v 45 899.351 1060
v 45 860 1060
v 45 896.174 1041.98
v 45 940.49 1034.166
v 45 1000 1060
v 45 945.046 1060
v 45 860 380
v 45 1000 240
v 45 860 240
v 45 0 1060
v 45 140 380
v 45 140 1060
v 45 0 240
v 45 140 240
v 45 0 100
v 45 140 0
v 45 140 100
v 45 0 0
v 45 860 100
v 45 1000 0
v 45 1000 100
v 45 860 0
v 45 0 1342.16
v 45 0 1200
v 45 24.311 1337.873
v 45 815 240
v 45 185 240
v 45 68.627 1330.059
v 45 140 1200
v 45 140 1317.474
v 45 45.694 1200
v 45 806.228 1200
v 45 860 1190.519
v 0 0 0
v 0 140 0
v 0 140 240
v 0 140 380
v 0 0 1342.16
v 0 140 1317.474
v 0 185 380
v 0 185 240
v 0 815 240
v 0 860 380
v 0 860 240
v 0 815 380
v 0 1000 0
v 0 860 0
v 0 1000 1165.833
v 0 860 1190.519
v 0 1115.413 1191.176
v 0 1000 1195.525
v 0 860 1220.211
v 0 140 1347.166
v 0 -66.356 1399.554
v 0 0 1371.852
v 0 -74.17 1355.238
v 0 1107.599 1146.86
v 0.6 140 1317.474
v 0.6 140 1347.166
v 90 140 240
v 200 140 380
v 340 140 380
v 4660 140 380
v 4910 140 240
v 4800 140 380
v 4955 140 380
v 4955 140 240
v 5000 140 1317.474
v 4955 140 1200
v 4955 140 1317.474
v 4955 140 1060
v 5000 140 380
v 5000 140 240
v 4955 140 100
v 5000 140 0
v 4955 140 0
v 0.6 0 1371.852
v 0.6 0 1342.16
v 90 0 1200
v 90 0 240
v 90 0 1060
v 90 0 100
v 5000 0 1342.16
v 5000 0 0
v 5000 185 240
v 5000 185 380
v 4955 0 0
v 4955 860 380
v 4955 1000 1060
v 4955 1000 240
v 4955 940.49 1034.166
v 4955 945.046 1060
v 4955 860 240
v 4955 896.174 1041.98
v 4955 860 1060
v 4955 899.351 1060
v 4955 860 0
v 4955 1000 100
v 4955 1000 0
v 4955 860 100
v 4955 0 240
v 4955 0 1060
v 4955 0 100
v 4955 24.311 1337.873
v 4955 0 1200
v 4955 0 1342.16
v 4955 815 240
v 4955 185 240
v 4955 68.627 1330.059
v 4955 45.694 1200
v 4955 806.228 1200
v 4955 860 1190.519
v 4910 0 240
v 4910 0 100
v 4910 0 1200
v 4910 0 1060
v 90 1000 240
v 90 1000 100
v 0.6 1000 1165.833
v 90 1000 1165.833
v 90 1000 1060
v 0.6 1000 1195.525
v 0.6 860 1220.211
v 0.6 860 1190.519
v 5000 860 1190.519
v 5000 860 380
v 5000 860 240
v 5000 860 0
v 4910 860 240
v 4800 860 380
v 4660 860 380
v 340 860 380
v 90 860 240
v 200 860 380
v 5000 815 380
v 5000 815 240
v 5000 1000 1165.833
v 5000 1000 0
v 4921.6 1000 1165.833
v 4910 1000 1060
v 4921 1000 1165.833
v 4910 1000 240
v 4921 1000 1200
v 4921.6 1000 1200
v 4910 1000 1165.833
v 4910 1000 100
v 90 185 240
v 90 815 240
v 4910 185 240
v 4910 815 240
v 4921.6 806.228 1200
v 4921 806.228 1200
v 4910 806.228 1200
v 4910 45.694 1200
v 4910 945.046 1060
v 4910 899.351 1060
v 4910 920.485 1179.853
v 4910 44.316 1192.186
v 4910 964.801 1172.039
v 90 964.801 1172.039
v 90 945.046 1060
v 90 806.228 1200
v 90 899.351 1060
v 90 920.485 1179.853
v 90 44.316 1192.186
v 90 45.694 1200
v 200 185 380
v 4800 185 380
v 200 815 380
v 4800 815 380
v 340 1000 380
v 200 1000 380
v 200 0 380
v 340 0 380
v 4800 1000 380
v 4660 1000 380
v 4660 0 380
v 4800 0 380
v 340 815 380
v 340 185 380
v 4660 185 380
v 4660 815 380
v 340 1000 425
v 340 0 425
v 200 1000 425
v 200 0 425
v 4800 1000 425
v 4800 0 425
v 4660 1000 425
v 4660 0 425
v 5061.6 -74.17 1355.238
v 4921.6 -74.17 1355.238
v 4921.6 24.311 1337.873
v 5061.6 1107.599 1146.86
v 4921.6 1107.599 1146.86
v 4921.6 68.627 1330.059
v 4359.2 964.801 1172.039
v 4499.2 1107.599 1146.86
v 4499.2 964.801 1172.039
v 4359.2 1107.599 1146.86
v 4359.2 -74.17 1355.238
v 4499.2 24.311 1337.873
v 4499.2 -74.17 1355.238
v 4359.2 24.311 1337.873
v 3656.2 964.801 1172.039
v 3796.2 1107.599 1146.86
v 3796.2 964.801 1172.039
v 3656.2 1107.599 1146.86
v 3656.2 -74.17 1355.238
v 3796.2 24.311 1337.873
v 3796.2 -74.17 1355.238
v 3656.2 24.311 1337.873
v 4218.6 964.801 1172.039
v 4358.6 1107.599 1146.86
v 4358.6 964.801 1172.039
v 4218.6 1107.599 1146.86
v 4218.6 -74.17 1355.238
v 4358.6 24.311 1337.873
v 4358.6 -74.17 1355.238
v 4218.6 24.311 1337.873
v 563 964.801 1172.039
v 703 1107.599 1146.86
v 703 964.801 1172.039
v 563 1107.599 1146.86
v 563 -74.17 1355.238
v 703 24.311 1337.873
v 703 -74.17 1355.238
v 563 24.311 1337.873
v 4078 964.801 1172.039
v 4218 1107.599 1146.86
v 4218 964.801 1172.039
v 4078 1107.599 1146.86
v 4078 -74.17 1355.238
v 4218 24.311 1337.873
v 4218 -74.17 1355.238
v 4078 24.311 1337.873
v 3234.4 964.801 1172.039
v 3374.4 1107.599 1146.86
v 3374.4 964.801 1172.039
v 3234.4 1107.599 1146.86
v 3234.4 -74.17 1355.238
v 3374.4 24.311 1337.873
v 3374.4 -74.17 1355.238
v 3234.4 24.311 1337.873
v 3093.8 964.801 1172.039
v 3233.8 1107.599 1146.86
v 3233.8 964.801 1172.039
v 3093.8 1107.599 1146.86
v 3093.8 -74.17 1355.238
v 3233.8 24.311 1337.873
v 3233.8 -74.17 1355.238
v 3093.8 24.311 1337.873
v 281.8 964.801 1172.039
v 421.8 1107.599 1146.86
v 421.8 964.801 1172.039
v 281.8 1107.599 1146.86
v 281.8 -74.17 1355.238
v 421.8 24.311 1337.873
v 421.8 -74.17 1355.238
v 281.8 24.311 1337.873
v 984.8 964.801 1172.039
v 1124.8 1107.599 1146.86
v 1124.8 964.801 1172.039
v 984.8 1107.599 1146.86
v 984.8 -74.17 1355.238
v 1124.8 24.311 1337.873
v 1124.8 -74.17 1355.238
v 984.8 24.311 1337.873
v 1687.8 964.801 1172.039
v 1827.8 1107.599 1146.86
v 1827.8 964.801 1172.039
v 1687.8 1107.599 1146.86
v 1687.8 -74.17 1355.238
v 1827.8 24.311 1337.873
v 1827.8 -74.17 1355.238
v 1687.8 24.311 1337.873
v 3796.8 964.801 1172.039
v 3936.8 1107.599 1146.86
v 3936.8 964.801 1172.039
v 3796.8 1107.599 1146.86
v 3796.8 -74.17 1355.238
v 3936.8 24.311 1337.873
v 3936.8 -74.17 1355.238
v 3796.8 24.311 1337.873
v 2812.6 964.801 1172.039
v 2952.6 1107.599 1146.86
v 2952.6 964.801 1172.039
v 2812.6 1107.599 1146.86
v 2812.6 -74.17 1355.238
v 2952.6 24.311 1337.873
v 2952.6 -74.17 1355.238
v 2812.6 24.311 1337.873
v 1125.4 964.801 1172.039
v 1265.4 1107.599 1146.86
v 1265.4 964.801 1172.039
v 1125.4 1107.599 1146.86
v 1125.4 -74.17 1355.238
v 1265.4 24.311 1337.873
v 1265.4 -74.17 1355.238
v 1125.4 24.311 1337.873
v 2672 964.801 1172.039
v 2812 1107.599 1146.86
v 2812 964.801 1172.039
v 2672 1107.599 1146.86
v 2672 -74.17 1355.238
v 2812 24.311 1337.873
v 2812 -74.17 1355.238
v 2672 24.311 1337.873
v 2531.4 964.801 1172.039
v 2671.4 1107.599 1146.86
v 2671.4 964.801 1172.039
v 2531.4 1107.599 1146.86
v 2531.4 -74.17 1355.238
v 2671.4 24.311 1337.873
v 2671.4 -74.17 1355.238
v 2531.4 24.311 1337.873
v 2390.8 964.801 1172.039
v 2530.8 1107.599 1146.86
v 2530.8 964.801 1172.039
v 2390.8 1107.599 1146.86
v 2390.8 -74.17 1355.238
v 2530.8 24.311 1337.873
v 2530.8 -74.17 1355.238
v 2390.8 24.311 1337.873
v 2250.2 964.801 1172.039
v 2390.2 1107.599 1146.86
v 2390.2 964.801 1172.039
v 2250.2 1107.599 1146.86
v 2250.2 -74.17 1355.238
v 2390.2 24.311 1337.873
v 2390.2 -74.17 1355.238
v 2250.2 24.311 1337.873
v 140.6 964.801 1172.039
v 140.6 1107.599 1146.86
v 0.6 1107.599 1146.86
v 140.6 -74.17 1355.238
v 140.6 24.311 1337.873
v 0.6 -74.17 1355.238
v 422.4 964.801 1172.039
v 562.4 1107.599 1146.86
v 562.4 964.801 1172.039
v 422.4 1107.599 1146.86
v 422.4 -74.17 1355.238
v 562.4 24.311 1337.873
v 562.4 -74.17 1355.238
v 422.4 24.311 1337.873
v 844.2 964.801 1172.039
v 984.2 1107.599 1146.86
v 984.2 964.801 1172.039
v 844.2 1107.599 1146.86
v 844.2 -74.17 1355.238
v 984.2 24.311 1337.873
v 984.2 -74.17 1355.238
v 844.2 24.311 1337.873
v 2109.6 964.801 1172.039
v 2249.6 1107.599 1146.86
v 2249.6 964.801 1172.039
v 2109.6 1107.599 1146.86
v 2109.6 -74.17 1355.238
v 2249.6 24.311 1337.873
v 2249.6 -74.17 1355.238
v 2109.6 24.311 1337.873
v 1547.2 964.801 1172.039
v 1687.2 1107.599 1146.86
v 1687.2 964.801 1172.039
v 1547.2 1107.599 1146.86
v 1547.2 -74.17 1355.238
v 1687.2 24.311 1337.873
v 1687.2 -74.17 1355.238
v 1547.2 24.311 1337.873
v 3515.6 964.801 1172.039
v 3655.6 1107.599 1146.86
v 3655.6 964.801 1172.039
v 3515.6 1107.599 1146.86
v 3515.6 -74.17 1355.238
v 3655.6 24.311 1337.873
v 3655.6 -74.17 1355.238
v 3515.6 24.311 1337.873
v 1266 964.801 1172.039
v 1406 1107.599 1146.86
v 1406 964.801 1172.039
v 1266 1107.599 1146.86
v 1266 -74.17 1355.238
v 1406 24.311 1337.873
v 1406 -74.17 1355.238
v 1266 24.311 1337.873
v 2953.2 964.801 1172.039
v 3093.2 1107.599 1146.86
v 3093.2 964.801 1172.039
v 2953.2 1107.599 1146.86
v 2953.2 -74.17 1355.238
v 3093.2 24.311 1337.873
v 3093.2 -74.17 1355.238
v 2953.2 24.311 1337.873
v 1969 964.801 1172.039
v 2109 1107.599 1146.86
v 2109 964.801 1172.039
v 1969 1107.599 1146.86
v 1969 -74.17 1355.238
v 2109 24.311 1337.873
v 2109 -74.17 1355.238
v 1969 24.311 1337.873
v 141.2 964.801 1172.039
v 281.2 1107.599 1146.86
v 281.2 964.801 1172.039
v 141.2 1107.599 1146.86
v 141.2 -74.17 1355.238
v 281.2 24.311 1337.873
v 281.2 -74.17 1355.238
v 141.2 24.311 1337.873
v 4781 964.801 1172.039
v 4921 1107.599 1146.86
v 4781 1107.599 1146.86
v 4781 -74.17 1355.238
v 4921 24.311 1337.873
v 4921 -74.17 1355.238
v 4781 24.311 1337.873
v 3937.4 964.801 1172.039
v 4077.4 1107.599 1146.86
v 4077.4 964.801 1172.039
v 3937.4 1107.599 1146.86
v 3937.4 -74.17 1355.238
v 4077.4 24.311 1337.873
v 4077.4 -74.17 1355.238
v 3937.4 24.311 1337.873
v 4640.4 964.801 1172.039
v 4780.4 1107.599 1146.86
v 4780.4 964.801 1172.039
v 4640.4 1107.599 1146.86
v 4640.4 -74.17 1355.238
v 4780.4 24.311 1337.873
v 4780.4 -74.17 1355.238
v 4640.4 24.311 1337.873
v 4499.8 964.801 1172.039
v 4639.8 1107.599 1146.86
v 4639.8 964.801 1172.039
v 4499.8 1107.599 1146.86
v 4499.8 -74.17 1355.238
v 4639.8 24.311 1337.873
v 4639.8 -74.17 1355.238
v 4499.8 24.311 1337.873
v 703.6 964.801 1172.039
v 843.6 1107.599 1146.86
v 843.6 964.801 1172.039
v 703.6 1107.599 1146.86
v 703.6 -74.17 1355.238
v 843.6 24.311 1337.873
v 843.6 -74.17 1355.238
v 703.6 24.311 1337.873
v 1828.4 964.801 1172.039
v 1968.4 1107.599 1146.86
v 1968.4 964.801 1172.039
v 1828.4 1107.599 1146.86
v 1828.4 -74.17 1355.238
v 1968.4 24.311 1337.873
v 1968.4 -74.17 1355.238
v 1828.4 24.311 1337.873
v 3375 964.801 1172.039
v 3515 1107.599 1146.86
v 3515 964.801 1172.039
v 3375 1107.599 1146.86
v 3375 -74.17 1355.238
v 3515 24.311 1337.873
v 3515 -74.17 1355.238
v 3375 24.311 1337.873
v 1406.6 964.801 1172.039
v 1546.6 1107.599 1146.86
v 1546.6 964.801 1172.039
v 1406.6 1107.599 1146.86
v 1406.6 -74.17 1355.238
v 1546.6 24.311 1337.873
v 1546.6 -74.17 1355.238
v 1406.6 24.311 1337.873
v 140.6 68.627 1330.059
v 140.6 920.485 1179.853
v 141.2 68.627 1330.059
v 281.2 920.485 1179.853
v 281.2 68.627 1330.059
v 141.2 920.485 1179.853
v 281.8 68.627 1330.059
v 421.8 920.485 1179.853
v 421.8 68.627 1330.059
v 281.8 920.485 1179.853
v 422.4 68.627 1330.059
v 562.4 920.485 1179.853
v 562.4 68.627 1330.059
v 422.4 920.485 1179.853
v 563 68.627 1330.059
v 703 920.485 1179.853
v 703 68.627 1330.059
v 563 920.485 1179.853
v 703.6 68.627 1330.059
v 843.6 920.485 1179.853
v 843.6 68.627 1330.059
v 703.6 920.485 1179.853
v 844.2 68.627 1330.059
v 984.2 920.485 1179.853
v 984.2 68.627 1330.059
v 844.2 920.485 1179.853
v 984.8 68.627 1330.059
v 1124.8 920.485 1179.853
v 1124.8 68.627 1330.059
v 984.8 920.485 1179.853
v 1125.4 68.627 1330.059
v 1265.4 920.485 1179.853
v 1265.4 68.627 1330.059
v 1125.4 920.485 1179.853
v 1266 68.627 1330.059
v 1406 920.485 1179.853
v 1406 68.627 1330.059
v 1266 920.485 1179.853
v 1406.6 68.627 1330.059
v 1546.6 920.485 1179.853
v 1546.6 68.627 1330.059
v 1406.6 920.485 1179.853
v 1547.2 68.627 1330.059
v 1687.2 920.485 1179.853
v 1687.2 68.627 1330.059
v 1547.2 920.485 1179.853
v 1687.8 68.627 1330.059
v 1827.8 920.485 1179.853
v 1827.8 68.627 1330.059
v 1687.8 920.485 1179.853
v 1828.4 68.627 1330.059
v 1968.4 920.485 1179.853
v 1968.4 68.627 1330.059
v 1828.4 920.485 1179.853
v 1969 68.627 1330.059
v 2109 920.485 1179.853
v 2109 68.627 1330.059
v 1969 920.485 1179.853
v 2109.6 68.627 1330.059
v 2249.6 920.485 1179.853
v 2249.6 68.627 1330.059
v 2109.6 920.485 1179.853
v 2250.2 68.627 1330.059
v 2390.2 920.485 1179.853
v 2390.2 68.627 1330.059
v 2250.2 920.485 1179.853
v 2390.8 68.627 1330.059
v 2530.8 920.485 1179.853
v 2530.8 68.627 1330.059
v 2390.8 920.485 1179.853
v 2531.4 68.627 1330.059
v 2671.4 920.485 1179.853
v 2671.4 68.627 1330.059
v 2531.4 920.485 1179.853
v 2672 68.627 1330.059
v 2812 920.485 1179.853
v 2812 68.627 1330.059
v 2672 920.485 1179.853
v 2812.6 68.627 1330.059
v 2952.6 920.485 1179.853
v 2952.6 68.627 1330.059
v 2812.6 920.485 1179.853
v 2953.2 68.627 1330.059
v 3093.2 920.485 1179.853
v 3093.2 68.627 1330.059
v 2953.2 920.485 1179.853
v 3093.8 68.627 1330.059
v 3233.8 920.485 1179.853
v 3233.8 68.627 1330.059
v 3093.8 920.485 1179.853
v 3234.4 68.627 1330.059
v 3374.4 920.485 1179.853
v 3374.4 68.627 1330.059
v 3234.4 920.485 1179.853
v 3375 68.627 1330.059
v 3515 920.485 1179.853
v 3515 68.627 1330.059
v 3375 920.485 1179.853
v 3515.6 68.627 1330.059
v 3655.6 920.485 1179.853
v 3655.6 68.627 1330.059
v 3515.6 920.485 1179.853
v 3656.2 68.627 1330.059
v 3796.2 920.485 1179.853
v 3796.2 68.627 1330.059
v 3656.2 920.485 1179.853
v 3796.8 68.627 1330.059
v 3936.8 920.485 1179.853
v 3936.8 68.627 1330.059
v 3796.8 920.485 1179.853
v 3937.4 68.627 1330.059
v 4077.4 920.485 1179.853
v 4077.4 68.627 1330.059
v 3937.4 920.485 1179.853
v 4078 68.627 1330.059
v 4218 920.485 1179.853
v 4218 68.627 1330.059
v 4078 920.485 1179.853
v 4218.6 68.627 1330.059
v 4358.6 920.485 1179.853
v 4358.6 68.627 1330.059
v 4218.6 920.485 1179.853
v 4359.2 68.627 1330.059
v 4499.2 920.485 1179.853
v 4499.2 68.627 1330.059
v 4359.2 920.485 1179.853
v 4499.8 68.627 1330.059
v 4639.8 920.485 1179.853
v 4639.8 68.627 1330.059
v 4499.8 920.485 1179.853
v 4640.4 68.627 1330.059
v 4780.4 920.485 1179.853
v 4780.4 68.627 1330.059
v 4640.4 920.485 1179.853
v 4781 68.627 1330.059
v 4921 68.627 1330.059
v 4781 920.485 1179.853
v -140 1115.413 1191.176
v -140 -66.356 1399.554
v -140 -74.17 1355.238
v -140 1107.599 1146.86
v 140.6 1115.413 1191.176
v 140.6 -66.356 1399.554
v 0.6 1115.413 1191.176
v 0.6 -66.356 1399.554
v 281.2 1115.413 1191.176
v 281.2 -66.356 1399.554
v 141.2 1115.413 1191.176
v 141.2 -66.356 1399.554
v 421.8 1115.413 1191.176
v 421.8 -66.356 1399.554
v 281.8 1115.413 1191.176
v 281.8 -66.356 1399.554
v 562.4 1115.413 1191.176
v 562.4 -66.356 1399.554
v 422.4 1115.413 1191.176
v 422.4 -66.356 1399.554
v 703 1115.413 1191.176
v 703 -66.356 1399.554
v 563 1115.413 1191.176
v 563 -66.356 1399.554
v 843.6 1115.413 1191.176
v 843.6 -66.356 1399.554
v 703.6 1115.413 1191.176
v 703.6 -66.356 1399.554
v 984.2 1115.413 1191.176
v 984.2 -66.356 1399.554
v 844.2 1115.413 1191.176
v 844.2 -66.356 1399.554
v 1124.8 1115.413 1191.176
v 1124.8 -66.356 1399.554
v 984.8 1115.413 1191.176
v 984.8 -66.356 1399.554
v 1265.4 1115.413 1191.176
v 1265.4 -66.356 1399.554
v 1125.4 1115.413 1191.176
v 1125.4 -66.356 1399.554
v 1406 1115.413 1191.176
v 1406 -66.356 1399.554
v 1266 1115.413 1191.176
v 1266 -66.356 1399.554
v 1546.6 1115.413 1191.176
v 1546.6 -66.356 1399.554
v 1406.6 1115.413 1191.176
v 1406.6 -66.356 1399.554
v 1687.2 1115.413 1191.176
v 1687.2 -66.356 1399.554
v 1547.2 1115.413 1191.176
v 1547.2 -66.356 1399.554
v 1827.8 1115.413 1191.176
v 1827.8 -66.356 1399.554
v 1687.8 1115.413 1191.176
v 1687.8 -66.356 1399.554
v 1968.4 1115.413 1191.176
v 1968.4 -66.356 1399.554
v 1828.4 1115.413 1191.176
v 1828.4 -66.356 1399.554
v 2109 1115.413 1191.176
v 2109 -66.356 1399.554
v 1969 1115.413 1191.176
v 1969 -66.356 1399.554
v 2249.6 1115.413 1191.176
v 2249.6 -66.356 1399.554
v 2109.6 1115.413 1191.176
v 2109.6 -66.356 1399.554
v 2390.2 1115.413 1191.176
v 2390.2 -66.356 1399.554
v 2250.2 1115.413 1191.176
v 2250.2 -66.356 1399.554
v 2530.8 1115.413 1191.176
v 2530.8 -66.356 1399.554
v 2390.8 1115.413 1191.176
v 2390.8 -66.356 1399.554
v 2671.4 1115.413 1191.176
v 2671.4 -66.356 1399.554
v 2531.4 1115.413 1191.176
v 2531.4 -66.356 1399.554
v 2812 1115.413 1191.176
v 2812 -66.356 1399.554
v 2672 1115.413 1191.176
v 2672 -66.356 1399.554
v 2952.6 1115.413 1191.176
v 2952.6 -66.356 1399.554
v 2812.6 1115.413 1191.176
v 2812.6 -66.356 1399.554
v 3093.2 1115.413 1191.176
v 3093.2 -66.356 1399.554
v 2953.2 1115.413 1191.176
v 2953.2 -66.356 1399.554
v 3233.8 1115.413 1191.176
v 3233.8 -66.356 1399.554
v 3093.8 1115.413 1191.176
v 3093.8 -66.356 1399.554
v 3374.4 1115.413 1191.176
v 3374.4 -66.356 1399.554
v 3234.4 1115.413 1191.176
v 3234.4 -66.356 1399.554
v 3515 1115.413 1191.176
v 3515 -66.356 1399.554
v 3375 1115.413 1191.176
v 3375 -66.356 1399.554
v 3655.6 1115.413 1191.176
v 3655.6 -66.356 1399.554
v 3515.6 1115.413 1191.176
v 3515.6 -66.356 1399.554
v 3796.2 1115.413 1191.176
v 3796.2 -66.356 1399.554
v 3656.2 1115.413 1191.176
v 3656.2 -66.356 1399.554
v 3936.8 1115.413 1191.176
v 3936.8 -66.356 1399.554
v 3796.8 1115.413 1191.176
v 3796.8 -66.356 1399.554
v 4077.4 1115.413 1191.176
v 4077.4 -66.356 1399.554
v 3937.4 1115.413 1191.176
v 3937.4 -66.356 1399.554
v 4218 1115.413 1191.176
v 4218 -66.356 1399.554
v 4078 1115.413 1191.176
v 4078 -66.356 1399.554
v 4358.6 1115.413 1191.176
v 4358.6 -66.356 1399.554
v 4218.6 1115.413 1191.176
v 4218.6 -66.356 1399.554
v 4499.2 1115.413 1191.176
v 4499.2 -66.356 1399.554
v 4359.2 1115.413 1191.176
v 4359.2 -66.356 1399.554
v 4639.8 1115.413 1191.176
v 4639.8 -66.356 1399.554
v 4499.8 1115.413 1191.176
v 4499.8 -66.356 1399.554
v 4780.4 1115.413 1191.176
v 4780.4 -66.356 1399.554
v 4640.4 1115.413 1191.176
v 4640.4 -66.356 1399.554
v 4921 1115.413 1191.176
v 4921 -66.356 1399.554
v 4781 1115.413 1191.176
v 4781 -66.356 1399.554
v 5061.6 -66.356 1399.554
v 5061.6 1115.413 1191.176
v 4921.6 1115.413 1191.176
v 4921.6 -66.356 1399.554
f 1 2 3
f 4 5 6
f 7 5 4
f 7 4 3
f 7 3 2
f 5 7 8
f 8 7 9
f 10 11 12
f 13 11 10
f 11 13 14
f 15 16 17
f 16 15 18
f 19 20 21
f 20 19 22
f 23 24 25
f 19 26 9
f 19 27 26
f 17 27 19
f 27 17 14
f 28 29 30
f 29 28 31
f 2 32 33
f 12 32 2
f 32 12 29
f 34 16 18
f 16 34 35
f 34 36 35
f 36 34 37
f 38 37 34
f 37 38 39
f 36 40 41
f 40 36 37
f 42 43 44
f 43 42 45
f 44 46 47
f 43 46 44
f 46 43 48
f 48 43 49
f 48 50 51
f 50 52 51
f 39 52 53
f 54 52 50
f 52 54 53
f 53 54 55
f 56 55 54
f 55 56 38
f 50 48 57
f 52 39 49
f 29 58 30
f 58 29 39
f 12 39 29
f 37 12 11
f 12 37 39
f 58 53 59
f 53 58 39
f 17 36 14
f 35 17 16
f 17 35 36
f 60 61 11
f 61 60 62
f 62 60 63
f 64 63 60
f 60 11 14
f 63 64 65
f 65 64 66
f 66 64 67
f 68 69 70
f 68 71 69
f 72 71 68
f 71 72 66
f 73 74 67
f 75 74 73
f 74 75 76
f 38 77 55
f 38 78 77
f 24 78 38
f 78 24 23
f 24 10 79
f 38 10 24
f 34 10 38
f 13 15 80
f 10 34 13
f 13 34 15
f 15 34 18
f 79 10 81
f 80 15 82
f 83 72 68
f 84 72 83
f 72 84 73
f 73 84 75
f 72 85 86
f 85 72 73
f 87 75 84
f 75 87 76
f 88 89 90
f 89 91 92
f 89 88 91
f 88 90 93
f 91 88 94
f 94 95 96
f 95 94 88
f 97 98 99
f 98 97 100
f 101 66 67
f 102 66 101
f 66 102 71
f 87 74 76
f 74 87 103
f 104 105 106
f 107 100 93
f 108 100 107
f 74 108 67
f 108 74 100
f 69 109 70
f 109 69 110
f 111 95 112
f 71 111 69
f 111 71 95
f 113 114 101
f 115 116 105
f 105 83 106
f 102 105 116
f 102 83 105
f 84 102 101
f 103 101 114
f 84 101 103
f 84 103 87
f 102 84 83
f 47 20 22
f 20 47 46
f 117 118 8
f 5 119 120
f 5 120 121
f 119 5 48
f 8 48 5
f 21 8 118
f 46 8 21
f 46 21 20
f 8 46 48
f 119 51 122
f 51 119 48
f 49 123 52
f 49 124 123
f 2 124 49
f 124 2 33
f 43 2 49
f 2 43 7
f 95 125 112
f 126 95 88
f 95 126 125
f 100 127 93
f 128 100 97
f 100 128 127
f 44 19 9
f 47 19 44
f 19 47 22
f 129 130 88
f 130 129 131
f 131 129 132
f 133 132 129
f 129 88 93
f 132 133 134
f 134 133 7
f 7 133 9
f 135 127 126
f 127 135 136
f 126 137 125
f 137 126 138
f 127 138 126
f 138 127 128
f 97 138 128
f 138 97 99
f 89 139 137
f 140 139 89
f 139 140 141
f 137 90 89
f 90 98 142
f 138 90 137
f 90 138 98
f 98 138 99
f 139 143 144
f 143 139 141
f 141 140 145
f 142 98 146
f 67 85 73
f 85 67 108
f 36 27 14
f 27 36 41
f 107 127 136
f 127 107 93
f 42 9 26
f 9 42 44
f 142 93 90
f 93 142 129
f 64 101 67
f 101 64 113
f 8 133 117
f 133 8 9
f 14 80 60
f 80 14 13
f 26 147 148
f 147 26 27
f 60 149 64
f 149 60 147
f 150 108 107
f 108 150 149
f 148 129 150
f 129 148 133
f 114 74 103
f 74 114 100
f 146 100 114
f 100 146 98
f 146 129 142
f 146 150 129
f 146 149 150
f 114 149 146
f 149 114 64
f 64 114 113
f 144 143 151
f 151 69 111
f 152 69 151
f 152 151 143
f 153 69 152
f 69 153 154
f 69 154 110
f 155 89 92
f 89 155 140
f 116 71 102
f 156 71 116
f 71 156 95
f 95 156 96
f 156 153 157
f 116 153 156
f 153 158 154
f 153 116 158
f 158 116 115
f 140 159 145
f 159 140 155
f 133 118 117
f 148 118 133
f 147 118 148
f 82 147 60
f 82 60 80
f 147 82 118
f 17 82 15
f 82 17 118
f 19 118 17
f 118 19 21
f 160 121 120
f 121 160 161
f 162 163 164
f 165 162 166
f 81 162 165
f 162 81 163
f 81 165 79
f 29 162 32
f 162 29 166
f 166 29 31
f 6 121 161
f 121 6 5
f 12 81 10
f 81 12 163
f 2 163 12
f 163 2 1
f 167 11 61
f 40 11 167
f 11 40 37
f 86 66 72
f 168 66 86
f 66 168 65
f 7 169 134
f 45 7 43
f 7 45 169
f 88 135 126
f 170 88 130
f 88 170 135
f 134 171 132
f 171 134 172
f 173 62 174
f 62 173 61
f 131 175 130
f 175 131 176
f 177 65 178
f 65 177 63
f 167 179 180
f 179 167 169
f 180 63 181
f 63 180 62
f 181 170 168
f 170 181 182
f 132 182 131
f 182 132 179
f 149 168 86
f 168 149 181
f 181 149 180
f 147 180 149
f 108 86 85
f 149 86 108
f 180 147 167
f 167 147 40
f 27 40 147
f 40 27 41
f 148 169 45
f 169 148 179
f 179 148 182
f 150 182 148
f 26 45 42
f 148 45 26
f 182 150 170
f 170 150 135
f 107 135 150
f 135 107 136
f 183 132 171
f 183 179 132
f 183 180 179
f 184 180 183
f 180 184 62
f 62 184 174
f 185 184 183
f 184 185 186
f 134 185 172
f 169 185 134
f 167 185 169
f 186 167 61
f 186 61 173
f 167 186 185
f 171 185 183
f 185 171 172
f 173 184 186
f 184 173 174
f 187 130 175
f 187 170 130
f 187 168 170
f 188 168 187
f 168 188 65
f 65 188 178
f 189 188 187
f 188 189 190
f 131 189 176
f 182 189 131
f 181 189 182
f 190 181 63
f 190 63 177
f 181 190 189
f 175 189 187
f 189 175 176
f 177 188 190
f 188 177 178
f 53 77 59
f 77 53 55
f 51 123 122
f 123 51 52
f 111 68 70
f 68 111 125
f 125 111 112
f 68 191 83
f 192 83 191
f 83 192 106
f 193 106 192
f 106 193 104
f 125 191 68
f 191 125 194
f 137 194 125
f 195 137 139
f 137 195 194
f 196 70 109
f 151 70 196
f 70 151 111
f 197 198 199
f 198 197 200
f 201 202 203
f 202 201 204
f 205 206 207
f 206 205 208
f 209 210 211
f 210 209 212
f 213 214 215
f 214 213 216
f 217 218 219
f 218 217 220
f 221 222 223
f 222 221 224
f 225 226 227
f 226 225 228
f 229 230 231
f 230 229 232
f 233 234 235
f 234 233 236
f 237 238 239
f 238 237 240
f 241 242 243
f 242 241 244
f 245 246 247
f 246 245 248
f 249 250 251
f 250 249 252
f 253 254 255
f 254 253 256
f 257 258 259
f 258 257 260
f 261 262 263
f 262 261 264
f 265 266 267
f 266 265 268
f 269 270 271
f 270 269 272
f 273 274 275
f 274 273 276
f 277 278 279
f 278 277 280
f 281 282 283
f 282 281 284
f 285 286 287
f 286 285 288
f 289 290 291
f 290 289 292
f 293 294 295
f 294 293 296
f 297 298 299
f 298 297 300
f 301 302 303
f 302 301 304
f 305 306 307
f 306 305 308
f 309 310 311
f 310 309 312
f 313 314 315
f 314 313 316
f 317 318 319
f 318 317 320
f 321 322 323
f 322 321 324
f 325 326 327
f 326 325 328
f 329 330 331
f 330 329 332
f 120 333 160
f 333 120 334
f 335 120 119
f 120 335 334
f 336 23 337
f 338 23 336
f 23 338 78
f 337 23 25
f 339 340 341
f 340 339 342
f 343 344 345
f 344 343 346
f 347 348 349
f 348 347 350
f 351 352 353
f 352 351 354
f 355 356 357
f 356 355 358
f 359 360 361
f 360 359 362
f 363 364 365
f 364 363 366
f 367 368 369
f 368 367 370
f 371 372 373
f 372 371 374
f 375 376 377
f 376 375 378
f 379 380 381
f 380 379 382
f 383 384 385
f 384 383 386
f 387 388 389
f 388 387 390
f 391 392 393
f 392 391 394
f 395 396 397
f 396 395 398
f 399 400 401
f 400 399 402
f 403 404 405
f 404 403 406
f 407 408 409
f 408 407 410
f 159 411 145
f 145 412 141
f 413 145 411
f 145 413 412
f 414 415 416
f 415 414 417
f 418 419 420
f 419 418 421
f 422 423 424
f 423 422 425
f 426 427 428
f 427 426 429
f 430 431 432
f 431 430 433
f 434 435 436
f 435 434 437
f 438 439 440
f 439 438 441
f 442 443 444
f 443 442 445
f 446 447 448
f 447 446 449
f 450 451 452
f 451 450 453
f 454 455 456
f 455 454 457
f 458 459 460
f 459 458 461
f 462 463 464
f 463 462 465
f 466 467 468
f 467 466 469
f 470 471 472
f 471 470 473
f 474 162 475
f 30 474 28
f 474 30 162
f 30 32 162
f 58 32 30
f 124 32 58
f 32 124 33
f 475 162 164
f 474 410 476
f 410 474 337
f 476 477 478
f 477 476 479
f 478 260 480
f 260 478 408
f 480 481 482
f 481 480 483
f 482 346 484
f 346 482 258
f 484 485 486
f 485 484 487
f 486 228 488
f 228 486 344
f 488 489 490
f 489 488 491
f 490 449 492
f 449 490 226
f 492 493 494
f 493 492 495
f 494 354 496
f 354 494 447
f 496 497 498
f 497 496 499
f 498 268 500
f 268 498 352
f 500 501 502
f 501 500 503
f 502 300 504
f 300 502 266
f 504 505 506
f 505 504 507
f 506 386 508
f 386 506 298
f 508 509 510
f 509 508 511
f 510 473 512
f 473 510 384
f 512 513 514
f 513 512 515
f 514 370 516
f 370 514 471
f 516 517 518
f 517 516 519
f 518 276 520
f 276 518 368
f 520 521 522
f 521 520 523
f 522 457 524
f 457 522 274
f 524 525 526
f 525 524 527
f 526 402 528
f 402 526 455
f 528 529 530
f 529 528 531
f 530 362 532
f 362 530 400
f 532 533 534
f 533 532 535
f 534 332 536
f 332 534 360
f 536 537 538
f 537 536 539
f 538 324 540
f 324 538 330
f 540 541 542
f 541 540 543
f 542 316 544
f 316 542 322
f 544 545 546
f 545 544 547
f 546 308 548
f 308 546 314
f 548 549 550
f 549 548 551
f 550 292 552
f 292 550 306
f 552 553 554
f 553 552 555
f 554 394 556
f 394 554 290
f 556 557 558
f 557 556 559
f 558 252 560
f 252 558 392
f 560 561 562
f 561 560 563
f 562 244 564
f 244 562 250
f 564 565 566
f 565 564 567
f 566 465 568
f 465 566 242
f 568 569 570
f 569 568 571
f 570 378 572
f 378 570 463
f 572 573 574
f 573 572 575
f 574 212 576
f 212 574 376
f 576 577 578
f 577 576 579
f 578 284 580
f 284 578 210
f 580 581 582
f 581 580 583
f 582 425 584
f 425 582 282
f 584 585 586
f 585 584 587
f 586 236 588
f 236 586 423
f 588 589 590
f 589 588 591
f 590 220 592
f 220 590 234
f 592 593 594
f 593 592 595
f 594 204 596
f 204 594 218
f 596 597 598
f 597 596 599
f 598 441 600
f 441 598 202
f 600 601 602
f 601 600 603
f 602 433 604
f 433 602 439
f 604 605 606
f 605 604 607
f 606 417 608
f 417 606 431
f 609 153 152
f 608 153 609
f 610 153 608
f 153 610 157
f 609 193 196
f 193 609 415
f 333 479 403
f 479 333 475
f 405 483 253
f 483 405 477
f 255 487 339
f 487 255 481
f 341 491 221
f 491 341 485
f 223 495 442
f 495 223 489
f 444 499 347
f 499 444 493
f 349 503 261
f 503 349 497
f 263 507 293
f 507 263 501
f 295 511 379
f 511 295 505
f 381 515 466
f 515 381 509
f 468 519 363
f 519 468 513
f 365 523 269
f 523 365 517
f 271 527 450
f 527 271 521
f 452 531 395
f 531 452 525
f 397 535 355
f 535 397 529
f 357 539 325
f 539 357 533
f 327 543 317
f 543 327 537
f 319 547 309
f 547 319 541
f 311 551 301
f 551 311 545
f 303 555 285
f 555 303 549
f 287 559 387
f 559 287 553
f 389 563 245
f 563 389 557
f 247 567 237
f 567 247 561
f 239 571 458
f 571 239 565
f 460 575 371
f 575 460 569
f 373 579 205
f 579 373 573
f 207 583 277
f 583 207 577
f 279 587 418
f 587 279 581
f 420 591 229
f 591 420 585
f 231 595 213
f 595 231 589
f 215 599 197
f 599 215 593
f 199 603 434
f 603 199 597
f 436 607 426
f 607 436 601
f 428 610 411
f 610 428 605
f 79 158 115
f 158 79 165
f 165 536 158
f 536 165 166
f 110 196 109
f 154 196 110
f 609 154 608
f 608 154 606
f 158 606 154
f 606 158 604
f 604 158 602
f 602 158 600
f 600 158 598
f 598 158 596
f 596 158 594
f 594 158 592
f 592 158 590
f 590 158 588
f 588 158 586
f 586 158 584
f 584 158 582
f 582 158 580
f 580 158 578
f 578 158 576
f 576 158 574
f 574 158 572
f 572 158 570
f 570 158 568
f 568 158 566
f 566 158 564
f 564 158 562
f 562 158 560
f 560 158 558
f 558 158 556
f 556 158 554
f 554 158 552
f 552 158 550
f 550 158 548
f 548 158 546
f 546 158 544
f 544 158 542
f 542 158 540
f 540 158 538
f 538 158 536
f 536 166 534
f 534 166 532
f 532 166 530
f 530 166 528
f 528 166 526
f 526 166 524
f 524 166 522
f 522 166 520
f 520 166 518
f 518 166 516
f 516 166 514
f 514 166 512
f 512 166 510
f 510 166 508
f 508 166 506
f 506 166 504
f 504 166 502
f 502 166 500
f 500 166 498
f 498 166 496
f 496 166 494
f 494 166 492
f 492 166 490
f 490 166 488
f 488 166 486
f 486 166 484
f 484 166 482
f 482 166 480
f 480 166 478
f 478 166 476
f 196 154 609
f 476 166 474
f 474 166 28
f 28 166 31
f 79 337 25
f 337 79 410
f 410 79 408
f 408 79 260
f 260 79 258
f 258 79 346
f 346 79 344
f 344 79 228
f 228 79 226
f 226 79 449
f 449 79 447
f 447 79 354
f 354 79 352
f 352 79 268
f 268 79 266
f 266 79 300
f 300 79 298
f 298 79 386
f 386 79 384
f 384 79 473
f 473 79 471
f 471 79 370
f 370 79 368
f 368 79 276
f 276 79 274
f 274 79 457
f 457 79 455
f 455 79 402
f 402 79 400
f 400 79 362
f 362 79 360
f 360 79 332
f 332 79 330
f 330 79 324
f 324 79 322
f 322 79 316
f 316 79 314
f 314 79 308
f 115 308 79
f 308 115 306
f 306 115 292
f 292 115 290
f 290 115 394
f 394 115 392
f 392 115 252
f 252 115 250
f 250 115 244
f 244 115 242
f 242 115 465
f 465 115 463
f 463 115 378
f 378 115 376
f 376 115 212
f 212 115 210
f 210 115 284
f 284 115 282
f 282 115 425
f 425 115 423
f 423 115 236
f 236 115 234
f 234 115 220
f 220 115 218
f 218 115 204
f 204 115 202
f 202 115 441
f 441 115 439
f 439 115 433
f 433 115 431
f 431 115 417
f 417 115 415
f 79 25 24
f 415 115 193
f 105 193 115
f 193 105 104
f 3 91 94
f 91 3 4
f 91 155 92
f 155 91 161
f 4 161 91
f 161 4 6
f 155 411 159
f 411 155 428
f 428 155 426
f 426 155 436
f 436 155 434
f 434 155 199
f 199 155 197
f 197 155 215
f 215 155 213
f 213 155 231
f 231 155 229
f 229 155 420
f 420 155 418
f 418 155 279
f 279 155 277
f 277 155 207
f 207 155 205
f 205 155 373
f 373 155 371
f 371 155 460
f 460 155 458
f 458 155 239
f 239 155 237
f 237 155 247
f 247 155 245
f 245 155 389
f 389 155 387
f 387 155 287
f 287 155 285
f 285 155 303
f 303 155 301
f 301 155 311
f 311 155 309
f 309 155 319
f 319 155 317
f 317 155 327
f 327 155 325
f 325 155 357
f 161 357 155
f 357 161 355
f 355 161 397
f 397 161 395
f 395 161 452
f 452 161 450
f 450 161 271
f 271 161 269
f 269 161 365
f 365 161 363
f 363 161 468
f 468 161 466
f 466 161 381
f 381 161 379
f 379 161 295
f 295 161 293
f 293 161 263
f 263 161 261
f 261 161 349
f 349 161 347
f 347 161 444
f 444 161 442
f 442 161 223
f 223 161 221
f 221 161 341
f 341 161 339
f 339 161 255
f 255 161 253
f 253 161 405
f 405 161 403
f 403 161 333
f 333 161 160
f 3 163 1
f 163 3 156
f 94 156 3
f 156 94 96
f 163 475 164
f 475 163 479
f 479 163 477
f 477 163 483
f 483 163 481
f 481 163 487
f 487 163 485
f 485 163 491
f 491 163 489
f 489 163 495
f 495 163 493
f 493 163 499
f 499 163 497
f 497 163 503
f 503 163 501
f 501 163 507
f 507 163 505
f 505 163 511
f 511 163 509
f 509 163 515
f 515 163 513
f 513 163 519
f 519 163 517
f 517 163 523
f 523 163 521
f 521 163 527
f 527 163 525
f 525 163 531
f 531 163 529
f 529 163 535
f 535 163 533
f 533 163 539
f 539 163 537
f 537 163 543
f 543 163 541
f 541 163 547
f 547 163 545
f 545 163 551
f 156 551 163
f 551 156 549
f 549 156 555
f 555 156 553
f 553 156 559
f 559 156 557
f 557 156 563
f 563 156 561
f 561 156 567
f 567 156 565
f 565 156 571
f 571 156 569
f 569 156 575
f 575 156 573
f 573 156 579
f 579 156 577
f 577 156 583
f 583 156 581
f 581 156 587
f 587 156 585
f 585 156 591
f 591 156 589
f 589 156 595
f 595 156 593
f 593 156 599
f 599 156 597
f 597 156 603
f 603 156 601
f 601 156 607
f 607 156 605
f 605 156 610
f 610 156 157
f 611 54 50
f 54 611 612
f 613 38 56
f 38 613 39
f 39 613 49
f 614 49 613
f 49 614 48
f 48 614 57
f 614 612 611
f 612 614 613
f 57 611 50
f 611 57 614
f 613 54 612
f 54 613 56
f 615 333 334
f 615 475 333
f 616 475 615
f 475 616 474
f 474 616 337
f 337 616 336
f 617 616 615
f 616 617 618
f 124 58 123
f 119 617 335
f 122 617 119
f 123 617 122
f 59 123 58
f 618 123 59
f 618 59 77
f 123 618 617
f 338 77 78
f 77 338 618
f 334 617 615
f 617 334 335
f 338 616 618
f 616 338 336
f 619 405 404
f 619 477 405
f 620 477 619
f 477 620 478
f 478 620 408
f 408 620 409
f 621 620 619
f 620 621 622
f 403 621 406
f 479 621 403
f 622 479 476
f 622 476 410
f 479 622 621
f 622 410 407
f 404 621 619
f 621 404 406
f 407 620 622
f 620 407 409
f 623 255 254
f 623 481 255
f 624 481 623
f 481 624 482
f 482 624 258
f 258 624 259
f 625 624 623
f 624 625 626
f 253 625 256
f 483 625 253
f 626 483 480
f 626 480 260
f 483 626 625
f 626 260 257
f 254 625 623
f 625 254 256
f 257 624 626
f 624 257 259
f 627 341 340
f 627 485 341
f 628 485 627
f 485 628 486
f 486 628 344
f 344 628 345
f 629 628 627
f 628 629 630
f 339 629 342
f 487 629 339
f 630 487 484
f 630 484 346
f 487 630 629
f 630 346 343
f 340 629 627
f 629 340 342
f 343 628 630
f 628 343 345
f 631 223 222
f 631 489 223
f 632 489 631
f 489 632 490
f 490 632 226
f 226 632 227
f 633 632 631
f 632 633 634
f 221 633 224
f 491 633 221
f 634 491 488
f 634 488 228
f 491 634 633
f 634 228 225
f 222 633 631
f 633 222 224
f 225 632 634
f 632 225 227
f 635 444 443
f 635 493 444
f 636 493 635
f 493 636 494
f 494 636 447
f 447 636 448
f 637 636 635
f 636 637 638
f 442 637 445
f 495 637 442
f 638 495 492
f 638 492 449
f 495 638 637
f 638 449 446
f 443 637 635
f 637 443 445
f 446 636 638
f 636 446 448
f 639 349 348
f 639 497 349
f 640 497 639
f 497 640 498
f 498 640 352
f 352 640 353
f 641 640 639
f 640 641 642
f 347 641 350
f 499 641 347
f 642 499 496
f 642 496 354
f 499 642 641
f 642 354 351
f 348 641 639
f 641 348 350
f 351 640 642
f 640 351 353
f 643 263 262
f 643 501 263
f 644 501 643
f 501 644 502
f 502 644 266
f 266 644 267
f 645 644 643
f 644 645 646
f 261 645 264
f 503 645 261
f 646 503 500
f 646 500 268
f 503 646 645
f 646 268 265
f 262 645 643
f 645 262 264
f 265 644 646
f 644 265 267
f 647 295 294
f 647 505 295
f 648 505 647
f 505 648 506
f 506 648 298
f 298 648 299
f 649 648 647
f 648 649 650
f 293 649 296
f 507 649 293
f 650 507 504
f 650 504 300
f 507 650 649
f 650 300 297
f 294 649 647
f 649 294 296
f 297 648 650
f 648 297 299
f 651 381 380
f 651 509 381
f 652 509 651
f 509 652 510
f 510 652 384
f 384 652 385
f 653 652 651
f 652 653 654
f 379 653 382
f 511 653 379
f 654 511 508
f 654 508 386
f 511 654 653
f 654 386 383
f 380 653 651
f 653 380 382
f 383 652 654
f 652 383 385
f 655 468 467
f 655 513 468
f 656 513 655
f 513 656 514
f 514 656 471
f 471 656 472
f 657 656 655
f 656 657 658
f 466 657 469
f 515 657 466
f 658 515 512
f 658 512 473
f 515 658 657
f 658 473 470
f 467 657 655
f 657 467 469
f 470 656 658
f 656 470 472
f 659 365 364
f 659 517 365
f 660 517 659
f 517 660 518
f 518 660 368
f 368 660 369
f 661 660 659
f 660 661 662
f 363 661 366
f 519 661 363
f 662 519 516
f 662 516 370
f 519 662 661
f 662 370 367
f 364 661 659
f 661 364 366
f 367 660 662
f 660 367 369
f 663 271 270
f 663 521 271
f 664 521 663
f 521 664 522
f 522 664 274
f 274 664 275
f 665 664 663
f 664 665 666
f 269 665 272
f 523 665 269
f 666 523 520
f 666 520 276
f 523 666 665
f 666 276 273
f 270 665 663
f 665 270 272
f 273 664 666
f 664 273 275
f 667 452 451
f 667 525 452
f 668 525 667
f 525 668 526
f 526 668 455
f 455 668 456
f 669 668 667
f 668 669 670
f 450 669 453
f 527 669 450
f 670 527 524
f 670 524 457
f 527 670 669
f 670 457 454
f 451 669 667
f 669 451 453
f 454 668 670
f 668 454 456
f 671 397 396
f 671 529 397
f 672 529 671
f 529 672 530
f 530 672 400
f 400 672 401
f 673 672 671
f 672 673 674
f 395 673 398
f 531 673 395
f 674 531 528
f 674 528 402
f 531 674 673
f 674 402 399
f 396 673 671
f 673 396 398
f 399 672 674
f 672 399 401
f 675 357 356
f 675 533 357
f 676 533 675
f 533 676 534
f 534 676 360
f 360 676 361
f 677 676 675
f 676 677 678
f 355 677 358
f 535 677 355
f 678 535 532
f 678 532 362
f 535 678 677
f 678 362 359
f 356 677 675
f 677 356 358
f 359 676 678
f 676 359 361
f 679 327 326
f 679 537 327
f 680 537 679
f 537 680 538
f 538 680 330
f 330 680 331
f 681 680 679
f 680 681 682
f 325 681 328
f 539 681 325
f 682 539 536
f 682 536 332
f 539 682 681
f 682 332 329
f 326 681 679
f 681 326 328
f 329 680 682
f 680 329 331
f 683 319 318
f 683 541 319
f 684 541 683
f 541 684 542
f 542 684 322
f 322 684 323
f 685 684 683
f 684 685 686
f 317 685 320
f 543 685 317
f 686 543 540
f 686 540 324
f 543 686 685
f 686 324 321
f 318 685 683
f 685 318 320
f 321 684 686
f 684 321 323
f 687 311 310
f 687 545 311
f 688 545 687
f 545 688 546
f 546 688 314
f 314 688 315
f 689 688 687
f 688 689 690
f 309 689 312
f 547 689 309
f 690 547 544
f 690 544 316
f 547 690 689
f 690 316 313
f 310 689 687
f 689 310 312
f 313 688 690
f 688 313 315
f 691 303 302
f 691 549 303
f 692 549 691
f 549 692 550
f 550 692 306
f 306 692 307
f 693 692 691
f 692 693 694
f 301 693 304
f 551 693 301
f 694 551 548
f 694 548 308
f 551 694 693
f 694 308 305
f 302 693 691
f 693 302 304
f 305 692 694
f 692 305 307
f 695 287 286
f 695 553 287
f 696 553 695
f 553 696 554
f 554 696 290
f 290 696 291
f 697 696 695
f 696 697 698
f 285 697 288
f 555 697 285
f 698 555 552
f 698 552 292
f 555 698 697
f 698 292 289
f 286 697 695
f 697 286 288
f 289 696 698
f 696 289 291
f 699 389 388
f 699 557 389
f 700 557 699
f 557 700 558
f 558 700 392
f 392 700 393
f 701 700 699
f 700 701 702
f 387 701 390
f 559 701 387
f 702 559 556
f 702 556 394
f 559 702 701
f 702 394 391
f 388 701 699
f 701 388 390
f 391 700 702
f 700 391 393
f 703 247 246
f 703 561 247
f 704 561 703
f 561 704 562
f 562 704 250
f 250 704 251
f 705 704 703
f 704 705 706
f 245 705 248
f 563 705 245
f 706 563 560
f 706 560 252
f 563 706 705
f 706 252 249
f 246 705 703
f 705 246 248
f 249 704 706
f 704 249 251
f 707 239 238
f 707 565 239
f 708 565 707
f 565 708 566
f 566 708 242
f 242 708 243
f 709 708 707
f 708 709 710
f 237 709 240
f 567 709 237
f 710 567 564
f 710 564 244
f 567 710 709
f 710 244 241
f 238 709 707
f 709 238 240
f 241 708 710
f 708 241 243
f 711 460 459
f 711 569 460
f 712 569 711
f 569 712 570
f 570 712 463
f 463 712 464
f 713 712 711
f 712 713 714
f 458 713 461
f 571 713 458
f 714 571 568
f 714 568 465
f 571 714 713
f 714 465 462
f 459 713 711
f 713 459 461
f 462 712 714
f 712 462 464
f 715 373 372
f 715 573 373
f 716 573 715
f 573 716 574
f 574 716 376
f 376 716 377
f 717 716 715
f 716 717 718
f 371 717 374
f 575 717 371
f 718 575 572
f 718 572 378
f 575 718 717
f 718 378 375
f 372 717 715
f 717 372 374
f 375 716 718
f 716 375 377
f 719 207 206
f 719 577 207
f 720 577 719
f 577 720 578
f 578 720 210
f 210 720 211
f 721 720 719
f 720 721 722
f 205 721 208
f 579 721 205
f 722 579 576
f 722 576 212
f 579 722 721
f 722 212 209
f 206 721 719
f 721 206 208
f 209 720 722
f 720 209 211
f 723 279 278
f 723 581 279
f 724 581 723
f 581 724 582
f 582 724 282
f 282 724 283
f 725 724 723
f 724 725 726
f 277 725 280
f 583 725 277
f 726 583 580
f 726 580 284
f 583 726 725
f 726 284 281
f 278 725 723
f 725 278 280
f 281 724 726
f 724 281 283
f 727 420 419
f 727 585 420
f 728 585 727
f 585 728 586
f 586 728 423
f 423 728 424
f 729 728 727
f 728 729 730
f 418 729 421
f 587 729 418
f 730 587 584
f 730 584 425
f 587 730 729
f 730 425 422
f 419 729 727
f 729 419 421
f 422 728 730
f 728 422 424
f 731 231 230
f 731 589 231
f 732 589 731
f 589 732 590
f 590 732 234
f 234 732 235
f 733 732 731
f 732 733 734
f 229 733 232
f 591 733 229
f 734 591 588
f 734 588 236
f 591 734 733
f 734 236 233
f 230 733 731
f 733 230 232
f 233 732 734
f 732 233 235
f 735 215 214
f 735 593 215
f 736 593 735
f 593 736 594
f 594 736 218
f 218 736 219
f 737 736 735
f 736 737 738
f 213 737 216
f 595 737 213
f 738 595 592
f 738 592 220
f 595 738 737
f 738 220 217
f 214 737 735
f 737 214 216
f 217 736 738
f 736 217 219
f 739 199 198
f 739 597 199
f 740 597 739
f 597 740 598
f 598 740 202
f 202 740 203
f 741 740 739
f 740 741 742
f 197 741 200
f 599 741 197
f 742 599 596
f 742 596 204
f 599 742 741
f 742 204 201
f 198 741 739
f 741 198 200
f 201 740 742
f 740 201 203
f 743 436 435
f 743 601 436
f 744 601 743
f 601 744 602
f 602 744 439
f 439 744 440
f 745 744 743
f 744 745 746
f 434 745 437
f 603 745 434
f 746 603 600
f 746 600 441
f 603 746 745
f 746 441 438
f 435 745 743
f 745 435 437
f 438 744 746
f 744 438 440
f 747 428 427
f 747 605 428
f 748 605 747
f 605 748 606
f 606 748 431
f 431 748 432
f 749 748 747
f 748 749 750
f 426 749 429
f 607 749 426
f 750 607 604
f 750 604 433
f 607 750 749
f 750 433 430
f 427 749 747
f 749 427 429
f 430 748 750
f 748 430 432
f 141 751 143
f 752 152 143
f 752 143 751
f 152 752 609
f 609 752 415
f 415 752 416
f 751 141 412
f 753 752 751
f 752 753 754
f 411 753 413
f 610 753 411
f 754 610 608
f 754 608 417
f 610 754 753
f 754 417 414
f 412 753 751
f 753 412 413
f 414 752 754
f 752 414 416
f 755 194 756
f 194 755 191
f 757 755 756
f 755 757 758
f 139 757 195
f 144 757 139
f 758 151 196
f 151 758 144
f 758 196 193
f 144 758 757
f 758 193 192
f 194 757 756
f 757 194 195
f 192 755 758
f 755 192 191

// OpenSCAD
// file: roof.scad
/*

    Nightstand
    
    By Anton Augustsson
    
    
*/



module roof (
    rotation,roofHeight,
    studsAmount,
    plankWidth,plankThickness,
    totalWidth,totalLength,
    roofHangover,roofWidthIn){



// ---------- Calculated varables ----------
roofWidthOut = roofHangover*2+roofWidthIn; // calculated    
studsSpacing = (roofWidthIn-(studsAmount*plankThickness)) /(studsAmount-1)-0.001;  // calculated 
//studsAmount*plankThickness+i(studsAmount-1)=totalLength
    


// ---------- Code ---------- 

translate([0,0,roofHeight])
rotate([-rotation,0,0])     
union(){
    
// ---------- Stud ---------- 
color("Wheat")
union(){
for(i = [0:studsSpacing:roofWidthIn])
translate([
    0,
    i,
    0]) 
cube(size = [
    totalLength,
    plankThickness,
    plankWidth]);

}


// ---------- Roof ----------
color("Tan")
union(){
for(i = [-plankWidth:plankWidth+0.6:totalLength])
translate([
    i,
    -roofHangover,
    plankWidth]) 
cube(size = [
    plankWidth,
    roofWidthOut,
    plankThickness]);

}}}



/*
    ---------- Exampel ---------- 
*/


rotation = 10;
plankWidth     = 140;  // pine

plankThickness = 45;  // pine

totalWidth  = 1000;  // kayak width 
totalLength = 2000;  // kayak lenght

roofHangover = 100;  // etch side, only to studes
roofWidthIn  = 1000;  // calculated hypnotherapy, inner

studsAmount  = 2;  // kayak lenght, oposid diraction

roofHeight = 1;


roof (rotation,roofHeight,
    studsAmount,
    plankWidth,plankThickness,
    totalWidth,totalLength,
    roofHangover,roofWidthIn);
// file: foundation.scad
module foundation (
    rotation,
    plankWidth,plankThickness,
    totalWidth,totalLength,
    roofWidthIn,groundScrewHeight,
    pilleaLowestHeight,backPillarHeight,frontPillarHeight){
    
    
// ---------- Calculated varables ----------
backPillarHeight  = pilleaLowestHeight
    +tan(rotation)*plankWidth; // calculated
frontPillarHeight = pilleaLowestHeight
    +tan(rotation)*(roofWidthIn); // calculated     


// ---------- Code ---------- 

difference() {        
union(){    
// ---------- pillar ---------- 
color("Wheat")
union(){

// piller 1
translate([
    0,
    0,
    0]) 
cube(size = [
    plankThickness,
    plankWidth,
    frontPillarHeight]);
    
// piller 2
translate([
    totalLength-plankThickness,
    0,
    0]) 
cube(size = [
    plankThickness,
    plankWidth,
    frontPillarHeight]);
    
// piller 3
translate([
    0,
    totalWidth-plankWidth,
    0]) 
cube(size = [
    plankThickness,
    plankWidth,
    backPillarHeight]);
    
// piller 4
translate([
    totalLength-plankThickness,
    totalWidth-plankWidth,
    0]) 
cube(size = [
    plankThickness,
    plankWidth,
    backPillarHeight]);

}

union(){
// right lower stude
translate([
    totalLength-plankThickness*2,
    0,
    groundScrewHeight]) 
cube(size = [
    plankThickness,
    totalWidth,
    plankWidth]);

// right upper stude
translate([
    totalLength-plankThickness*2,
    0,
    pilleaLowestHeight-plankWidth]) 
cube(size = [
    plankThickness,
    totalWidth,
    plankWidth]);
    
// left lower stude
translate([
    plankThickness,
    0,
    groundScrewHeight]) 
cube(size = [
    plankThickness,
    totalWidth,
    plankWidth]);

// left upper stude
translate([
    plankThickness,
    0,
    pilleaLowestHeight-plankWidth]) 
cube(size = [
    plankThickness,
    totalWidth,
    plankWidth]);
}

union(){
// front stude
translate([
    0,
    plankWidth,
    groundScrewHeight+plankWidth]) 
cube(size = [
    totalLength,
    plankThickness,
    plankWidth]);

// back stude
translate([
    0,
    totalWidth-plankWidth-plankThickness,
    groundScrewHeight+plankWidth]) 
cube(size = [
    totalLength,
    plankThickness,
    plankWidth]);

}

union(){
// left kayak stude
translate([
    200,
    0,
    groundScrewHeight+plankWidth*2]) 
cube(size = [
    plankWidth,
    totalWidth,
    plankThickness]);

// right kayak stude
translate([
    totalLength-200-plankWidth,
    0,
    groundScrewHeight+plankWidth*2]) 
cube(size = [
    plankWidth,
    totalWidth,
    plankThickness]);
}

}

// moveDown = cos(rotation)*plankThickness
// 

rotate([-rotation,0,0])
union(){
translate([
    0,
    -291,
    frontPillarHeight-cos(rotation)*plankThickness+19]) 
cube(size = [
    plankWidth,
    totalWidth+100,
    plankThickness]);    

translate([
    totalLength-plankThickness,
    -291,
    frontPillarHeight-cos(rotation)*plankThickness+19]) 
cube(size = [
    plankWidth,
    totalWidth+100,
    plankThickness]);    

}

}}







// example
rotation = 10;

plankWidth     = 140;  // pine
plankThickness = 45;  // pine

totalWidth  = 1000;  // kayak width 
totalLength = 2000;  // kayak lenght

roofWidthIn  = 1000;  // calculated hypnotherapy, inner

pilleaLowestHeight = 1500; //

groundScrewHeight = 100;




foundation (
    rotation,
    plankWidth,plankThickness,
    totalWidth,totalLength,
    roofWidthIn,groundScrewHeight,
    pilleaLowestHeight);    
    
// main file
// t

use <foundation.scad>;
use <roof.scad>;


rotation = 10;
plankWidth     = 140;  // pine

plankThickness = 45;  // pine

totalWidth  = 1000;  // kayak width 
totalLength = 5000;  // kayak lenght

roofHangover = 100;  // etch side, only to studes
roofWidthIn  = 1000;  // calculated hypnotherapy, inner

studsAmount  = 2;  // kayak lenght, oposid diraction

pilleaLowestHeight = 1200; //
groundScrewHeight = 100;

roofHeight = pilleaLowestHeight;




foundation (
    rotation,
    plankWidth,plankThickness,
    totalWidth,totalLength,
    roofWidthIn,groundScrewHeight,
    pilleaLowestHeight);    
    


roof (rotation,roofHeight,
    studsAmount,
    plankWidth,plankThickness,
    totalWidth,totalLength,
    roofHangover,roofWidthIn);
